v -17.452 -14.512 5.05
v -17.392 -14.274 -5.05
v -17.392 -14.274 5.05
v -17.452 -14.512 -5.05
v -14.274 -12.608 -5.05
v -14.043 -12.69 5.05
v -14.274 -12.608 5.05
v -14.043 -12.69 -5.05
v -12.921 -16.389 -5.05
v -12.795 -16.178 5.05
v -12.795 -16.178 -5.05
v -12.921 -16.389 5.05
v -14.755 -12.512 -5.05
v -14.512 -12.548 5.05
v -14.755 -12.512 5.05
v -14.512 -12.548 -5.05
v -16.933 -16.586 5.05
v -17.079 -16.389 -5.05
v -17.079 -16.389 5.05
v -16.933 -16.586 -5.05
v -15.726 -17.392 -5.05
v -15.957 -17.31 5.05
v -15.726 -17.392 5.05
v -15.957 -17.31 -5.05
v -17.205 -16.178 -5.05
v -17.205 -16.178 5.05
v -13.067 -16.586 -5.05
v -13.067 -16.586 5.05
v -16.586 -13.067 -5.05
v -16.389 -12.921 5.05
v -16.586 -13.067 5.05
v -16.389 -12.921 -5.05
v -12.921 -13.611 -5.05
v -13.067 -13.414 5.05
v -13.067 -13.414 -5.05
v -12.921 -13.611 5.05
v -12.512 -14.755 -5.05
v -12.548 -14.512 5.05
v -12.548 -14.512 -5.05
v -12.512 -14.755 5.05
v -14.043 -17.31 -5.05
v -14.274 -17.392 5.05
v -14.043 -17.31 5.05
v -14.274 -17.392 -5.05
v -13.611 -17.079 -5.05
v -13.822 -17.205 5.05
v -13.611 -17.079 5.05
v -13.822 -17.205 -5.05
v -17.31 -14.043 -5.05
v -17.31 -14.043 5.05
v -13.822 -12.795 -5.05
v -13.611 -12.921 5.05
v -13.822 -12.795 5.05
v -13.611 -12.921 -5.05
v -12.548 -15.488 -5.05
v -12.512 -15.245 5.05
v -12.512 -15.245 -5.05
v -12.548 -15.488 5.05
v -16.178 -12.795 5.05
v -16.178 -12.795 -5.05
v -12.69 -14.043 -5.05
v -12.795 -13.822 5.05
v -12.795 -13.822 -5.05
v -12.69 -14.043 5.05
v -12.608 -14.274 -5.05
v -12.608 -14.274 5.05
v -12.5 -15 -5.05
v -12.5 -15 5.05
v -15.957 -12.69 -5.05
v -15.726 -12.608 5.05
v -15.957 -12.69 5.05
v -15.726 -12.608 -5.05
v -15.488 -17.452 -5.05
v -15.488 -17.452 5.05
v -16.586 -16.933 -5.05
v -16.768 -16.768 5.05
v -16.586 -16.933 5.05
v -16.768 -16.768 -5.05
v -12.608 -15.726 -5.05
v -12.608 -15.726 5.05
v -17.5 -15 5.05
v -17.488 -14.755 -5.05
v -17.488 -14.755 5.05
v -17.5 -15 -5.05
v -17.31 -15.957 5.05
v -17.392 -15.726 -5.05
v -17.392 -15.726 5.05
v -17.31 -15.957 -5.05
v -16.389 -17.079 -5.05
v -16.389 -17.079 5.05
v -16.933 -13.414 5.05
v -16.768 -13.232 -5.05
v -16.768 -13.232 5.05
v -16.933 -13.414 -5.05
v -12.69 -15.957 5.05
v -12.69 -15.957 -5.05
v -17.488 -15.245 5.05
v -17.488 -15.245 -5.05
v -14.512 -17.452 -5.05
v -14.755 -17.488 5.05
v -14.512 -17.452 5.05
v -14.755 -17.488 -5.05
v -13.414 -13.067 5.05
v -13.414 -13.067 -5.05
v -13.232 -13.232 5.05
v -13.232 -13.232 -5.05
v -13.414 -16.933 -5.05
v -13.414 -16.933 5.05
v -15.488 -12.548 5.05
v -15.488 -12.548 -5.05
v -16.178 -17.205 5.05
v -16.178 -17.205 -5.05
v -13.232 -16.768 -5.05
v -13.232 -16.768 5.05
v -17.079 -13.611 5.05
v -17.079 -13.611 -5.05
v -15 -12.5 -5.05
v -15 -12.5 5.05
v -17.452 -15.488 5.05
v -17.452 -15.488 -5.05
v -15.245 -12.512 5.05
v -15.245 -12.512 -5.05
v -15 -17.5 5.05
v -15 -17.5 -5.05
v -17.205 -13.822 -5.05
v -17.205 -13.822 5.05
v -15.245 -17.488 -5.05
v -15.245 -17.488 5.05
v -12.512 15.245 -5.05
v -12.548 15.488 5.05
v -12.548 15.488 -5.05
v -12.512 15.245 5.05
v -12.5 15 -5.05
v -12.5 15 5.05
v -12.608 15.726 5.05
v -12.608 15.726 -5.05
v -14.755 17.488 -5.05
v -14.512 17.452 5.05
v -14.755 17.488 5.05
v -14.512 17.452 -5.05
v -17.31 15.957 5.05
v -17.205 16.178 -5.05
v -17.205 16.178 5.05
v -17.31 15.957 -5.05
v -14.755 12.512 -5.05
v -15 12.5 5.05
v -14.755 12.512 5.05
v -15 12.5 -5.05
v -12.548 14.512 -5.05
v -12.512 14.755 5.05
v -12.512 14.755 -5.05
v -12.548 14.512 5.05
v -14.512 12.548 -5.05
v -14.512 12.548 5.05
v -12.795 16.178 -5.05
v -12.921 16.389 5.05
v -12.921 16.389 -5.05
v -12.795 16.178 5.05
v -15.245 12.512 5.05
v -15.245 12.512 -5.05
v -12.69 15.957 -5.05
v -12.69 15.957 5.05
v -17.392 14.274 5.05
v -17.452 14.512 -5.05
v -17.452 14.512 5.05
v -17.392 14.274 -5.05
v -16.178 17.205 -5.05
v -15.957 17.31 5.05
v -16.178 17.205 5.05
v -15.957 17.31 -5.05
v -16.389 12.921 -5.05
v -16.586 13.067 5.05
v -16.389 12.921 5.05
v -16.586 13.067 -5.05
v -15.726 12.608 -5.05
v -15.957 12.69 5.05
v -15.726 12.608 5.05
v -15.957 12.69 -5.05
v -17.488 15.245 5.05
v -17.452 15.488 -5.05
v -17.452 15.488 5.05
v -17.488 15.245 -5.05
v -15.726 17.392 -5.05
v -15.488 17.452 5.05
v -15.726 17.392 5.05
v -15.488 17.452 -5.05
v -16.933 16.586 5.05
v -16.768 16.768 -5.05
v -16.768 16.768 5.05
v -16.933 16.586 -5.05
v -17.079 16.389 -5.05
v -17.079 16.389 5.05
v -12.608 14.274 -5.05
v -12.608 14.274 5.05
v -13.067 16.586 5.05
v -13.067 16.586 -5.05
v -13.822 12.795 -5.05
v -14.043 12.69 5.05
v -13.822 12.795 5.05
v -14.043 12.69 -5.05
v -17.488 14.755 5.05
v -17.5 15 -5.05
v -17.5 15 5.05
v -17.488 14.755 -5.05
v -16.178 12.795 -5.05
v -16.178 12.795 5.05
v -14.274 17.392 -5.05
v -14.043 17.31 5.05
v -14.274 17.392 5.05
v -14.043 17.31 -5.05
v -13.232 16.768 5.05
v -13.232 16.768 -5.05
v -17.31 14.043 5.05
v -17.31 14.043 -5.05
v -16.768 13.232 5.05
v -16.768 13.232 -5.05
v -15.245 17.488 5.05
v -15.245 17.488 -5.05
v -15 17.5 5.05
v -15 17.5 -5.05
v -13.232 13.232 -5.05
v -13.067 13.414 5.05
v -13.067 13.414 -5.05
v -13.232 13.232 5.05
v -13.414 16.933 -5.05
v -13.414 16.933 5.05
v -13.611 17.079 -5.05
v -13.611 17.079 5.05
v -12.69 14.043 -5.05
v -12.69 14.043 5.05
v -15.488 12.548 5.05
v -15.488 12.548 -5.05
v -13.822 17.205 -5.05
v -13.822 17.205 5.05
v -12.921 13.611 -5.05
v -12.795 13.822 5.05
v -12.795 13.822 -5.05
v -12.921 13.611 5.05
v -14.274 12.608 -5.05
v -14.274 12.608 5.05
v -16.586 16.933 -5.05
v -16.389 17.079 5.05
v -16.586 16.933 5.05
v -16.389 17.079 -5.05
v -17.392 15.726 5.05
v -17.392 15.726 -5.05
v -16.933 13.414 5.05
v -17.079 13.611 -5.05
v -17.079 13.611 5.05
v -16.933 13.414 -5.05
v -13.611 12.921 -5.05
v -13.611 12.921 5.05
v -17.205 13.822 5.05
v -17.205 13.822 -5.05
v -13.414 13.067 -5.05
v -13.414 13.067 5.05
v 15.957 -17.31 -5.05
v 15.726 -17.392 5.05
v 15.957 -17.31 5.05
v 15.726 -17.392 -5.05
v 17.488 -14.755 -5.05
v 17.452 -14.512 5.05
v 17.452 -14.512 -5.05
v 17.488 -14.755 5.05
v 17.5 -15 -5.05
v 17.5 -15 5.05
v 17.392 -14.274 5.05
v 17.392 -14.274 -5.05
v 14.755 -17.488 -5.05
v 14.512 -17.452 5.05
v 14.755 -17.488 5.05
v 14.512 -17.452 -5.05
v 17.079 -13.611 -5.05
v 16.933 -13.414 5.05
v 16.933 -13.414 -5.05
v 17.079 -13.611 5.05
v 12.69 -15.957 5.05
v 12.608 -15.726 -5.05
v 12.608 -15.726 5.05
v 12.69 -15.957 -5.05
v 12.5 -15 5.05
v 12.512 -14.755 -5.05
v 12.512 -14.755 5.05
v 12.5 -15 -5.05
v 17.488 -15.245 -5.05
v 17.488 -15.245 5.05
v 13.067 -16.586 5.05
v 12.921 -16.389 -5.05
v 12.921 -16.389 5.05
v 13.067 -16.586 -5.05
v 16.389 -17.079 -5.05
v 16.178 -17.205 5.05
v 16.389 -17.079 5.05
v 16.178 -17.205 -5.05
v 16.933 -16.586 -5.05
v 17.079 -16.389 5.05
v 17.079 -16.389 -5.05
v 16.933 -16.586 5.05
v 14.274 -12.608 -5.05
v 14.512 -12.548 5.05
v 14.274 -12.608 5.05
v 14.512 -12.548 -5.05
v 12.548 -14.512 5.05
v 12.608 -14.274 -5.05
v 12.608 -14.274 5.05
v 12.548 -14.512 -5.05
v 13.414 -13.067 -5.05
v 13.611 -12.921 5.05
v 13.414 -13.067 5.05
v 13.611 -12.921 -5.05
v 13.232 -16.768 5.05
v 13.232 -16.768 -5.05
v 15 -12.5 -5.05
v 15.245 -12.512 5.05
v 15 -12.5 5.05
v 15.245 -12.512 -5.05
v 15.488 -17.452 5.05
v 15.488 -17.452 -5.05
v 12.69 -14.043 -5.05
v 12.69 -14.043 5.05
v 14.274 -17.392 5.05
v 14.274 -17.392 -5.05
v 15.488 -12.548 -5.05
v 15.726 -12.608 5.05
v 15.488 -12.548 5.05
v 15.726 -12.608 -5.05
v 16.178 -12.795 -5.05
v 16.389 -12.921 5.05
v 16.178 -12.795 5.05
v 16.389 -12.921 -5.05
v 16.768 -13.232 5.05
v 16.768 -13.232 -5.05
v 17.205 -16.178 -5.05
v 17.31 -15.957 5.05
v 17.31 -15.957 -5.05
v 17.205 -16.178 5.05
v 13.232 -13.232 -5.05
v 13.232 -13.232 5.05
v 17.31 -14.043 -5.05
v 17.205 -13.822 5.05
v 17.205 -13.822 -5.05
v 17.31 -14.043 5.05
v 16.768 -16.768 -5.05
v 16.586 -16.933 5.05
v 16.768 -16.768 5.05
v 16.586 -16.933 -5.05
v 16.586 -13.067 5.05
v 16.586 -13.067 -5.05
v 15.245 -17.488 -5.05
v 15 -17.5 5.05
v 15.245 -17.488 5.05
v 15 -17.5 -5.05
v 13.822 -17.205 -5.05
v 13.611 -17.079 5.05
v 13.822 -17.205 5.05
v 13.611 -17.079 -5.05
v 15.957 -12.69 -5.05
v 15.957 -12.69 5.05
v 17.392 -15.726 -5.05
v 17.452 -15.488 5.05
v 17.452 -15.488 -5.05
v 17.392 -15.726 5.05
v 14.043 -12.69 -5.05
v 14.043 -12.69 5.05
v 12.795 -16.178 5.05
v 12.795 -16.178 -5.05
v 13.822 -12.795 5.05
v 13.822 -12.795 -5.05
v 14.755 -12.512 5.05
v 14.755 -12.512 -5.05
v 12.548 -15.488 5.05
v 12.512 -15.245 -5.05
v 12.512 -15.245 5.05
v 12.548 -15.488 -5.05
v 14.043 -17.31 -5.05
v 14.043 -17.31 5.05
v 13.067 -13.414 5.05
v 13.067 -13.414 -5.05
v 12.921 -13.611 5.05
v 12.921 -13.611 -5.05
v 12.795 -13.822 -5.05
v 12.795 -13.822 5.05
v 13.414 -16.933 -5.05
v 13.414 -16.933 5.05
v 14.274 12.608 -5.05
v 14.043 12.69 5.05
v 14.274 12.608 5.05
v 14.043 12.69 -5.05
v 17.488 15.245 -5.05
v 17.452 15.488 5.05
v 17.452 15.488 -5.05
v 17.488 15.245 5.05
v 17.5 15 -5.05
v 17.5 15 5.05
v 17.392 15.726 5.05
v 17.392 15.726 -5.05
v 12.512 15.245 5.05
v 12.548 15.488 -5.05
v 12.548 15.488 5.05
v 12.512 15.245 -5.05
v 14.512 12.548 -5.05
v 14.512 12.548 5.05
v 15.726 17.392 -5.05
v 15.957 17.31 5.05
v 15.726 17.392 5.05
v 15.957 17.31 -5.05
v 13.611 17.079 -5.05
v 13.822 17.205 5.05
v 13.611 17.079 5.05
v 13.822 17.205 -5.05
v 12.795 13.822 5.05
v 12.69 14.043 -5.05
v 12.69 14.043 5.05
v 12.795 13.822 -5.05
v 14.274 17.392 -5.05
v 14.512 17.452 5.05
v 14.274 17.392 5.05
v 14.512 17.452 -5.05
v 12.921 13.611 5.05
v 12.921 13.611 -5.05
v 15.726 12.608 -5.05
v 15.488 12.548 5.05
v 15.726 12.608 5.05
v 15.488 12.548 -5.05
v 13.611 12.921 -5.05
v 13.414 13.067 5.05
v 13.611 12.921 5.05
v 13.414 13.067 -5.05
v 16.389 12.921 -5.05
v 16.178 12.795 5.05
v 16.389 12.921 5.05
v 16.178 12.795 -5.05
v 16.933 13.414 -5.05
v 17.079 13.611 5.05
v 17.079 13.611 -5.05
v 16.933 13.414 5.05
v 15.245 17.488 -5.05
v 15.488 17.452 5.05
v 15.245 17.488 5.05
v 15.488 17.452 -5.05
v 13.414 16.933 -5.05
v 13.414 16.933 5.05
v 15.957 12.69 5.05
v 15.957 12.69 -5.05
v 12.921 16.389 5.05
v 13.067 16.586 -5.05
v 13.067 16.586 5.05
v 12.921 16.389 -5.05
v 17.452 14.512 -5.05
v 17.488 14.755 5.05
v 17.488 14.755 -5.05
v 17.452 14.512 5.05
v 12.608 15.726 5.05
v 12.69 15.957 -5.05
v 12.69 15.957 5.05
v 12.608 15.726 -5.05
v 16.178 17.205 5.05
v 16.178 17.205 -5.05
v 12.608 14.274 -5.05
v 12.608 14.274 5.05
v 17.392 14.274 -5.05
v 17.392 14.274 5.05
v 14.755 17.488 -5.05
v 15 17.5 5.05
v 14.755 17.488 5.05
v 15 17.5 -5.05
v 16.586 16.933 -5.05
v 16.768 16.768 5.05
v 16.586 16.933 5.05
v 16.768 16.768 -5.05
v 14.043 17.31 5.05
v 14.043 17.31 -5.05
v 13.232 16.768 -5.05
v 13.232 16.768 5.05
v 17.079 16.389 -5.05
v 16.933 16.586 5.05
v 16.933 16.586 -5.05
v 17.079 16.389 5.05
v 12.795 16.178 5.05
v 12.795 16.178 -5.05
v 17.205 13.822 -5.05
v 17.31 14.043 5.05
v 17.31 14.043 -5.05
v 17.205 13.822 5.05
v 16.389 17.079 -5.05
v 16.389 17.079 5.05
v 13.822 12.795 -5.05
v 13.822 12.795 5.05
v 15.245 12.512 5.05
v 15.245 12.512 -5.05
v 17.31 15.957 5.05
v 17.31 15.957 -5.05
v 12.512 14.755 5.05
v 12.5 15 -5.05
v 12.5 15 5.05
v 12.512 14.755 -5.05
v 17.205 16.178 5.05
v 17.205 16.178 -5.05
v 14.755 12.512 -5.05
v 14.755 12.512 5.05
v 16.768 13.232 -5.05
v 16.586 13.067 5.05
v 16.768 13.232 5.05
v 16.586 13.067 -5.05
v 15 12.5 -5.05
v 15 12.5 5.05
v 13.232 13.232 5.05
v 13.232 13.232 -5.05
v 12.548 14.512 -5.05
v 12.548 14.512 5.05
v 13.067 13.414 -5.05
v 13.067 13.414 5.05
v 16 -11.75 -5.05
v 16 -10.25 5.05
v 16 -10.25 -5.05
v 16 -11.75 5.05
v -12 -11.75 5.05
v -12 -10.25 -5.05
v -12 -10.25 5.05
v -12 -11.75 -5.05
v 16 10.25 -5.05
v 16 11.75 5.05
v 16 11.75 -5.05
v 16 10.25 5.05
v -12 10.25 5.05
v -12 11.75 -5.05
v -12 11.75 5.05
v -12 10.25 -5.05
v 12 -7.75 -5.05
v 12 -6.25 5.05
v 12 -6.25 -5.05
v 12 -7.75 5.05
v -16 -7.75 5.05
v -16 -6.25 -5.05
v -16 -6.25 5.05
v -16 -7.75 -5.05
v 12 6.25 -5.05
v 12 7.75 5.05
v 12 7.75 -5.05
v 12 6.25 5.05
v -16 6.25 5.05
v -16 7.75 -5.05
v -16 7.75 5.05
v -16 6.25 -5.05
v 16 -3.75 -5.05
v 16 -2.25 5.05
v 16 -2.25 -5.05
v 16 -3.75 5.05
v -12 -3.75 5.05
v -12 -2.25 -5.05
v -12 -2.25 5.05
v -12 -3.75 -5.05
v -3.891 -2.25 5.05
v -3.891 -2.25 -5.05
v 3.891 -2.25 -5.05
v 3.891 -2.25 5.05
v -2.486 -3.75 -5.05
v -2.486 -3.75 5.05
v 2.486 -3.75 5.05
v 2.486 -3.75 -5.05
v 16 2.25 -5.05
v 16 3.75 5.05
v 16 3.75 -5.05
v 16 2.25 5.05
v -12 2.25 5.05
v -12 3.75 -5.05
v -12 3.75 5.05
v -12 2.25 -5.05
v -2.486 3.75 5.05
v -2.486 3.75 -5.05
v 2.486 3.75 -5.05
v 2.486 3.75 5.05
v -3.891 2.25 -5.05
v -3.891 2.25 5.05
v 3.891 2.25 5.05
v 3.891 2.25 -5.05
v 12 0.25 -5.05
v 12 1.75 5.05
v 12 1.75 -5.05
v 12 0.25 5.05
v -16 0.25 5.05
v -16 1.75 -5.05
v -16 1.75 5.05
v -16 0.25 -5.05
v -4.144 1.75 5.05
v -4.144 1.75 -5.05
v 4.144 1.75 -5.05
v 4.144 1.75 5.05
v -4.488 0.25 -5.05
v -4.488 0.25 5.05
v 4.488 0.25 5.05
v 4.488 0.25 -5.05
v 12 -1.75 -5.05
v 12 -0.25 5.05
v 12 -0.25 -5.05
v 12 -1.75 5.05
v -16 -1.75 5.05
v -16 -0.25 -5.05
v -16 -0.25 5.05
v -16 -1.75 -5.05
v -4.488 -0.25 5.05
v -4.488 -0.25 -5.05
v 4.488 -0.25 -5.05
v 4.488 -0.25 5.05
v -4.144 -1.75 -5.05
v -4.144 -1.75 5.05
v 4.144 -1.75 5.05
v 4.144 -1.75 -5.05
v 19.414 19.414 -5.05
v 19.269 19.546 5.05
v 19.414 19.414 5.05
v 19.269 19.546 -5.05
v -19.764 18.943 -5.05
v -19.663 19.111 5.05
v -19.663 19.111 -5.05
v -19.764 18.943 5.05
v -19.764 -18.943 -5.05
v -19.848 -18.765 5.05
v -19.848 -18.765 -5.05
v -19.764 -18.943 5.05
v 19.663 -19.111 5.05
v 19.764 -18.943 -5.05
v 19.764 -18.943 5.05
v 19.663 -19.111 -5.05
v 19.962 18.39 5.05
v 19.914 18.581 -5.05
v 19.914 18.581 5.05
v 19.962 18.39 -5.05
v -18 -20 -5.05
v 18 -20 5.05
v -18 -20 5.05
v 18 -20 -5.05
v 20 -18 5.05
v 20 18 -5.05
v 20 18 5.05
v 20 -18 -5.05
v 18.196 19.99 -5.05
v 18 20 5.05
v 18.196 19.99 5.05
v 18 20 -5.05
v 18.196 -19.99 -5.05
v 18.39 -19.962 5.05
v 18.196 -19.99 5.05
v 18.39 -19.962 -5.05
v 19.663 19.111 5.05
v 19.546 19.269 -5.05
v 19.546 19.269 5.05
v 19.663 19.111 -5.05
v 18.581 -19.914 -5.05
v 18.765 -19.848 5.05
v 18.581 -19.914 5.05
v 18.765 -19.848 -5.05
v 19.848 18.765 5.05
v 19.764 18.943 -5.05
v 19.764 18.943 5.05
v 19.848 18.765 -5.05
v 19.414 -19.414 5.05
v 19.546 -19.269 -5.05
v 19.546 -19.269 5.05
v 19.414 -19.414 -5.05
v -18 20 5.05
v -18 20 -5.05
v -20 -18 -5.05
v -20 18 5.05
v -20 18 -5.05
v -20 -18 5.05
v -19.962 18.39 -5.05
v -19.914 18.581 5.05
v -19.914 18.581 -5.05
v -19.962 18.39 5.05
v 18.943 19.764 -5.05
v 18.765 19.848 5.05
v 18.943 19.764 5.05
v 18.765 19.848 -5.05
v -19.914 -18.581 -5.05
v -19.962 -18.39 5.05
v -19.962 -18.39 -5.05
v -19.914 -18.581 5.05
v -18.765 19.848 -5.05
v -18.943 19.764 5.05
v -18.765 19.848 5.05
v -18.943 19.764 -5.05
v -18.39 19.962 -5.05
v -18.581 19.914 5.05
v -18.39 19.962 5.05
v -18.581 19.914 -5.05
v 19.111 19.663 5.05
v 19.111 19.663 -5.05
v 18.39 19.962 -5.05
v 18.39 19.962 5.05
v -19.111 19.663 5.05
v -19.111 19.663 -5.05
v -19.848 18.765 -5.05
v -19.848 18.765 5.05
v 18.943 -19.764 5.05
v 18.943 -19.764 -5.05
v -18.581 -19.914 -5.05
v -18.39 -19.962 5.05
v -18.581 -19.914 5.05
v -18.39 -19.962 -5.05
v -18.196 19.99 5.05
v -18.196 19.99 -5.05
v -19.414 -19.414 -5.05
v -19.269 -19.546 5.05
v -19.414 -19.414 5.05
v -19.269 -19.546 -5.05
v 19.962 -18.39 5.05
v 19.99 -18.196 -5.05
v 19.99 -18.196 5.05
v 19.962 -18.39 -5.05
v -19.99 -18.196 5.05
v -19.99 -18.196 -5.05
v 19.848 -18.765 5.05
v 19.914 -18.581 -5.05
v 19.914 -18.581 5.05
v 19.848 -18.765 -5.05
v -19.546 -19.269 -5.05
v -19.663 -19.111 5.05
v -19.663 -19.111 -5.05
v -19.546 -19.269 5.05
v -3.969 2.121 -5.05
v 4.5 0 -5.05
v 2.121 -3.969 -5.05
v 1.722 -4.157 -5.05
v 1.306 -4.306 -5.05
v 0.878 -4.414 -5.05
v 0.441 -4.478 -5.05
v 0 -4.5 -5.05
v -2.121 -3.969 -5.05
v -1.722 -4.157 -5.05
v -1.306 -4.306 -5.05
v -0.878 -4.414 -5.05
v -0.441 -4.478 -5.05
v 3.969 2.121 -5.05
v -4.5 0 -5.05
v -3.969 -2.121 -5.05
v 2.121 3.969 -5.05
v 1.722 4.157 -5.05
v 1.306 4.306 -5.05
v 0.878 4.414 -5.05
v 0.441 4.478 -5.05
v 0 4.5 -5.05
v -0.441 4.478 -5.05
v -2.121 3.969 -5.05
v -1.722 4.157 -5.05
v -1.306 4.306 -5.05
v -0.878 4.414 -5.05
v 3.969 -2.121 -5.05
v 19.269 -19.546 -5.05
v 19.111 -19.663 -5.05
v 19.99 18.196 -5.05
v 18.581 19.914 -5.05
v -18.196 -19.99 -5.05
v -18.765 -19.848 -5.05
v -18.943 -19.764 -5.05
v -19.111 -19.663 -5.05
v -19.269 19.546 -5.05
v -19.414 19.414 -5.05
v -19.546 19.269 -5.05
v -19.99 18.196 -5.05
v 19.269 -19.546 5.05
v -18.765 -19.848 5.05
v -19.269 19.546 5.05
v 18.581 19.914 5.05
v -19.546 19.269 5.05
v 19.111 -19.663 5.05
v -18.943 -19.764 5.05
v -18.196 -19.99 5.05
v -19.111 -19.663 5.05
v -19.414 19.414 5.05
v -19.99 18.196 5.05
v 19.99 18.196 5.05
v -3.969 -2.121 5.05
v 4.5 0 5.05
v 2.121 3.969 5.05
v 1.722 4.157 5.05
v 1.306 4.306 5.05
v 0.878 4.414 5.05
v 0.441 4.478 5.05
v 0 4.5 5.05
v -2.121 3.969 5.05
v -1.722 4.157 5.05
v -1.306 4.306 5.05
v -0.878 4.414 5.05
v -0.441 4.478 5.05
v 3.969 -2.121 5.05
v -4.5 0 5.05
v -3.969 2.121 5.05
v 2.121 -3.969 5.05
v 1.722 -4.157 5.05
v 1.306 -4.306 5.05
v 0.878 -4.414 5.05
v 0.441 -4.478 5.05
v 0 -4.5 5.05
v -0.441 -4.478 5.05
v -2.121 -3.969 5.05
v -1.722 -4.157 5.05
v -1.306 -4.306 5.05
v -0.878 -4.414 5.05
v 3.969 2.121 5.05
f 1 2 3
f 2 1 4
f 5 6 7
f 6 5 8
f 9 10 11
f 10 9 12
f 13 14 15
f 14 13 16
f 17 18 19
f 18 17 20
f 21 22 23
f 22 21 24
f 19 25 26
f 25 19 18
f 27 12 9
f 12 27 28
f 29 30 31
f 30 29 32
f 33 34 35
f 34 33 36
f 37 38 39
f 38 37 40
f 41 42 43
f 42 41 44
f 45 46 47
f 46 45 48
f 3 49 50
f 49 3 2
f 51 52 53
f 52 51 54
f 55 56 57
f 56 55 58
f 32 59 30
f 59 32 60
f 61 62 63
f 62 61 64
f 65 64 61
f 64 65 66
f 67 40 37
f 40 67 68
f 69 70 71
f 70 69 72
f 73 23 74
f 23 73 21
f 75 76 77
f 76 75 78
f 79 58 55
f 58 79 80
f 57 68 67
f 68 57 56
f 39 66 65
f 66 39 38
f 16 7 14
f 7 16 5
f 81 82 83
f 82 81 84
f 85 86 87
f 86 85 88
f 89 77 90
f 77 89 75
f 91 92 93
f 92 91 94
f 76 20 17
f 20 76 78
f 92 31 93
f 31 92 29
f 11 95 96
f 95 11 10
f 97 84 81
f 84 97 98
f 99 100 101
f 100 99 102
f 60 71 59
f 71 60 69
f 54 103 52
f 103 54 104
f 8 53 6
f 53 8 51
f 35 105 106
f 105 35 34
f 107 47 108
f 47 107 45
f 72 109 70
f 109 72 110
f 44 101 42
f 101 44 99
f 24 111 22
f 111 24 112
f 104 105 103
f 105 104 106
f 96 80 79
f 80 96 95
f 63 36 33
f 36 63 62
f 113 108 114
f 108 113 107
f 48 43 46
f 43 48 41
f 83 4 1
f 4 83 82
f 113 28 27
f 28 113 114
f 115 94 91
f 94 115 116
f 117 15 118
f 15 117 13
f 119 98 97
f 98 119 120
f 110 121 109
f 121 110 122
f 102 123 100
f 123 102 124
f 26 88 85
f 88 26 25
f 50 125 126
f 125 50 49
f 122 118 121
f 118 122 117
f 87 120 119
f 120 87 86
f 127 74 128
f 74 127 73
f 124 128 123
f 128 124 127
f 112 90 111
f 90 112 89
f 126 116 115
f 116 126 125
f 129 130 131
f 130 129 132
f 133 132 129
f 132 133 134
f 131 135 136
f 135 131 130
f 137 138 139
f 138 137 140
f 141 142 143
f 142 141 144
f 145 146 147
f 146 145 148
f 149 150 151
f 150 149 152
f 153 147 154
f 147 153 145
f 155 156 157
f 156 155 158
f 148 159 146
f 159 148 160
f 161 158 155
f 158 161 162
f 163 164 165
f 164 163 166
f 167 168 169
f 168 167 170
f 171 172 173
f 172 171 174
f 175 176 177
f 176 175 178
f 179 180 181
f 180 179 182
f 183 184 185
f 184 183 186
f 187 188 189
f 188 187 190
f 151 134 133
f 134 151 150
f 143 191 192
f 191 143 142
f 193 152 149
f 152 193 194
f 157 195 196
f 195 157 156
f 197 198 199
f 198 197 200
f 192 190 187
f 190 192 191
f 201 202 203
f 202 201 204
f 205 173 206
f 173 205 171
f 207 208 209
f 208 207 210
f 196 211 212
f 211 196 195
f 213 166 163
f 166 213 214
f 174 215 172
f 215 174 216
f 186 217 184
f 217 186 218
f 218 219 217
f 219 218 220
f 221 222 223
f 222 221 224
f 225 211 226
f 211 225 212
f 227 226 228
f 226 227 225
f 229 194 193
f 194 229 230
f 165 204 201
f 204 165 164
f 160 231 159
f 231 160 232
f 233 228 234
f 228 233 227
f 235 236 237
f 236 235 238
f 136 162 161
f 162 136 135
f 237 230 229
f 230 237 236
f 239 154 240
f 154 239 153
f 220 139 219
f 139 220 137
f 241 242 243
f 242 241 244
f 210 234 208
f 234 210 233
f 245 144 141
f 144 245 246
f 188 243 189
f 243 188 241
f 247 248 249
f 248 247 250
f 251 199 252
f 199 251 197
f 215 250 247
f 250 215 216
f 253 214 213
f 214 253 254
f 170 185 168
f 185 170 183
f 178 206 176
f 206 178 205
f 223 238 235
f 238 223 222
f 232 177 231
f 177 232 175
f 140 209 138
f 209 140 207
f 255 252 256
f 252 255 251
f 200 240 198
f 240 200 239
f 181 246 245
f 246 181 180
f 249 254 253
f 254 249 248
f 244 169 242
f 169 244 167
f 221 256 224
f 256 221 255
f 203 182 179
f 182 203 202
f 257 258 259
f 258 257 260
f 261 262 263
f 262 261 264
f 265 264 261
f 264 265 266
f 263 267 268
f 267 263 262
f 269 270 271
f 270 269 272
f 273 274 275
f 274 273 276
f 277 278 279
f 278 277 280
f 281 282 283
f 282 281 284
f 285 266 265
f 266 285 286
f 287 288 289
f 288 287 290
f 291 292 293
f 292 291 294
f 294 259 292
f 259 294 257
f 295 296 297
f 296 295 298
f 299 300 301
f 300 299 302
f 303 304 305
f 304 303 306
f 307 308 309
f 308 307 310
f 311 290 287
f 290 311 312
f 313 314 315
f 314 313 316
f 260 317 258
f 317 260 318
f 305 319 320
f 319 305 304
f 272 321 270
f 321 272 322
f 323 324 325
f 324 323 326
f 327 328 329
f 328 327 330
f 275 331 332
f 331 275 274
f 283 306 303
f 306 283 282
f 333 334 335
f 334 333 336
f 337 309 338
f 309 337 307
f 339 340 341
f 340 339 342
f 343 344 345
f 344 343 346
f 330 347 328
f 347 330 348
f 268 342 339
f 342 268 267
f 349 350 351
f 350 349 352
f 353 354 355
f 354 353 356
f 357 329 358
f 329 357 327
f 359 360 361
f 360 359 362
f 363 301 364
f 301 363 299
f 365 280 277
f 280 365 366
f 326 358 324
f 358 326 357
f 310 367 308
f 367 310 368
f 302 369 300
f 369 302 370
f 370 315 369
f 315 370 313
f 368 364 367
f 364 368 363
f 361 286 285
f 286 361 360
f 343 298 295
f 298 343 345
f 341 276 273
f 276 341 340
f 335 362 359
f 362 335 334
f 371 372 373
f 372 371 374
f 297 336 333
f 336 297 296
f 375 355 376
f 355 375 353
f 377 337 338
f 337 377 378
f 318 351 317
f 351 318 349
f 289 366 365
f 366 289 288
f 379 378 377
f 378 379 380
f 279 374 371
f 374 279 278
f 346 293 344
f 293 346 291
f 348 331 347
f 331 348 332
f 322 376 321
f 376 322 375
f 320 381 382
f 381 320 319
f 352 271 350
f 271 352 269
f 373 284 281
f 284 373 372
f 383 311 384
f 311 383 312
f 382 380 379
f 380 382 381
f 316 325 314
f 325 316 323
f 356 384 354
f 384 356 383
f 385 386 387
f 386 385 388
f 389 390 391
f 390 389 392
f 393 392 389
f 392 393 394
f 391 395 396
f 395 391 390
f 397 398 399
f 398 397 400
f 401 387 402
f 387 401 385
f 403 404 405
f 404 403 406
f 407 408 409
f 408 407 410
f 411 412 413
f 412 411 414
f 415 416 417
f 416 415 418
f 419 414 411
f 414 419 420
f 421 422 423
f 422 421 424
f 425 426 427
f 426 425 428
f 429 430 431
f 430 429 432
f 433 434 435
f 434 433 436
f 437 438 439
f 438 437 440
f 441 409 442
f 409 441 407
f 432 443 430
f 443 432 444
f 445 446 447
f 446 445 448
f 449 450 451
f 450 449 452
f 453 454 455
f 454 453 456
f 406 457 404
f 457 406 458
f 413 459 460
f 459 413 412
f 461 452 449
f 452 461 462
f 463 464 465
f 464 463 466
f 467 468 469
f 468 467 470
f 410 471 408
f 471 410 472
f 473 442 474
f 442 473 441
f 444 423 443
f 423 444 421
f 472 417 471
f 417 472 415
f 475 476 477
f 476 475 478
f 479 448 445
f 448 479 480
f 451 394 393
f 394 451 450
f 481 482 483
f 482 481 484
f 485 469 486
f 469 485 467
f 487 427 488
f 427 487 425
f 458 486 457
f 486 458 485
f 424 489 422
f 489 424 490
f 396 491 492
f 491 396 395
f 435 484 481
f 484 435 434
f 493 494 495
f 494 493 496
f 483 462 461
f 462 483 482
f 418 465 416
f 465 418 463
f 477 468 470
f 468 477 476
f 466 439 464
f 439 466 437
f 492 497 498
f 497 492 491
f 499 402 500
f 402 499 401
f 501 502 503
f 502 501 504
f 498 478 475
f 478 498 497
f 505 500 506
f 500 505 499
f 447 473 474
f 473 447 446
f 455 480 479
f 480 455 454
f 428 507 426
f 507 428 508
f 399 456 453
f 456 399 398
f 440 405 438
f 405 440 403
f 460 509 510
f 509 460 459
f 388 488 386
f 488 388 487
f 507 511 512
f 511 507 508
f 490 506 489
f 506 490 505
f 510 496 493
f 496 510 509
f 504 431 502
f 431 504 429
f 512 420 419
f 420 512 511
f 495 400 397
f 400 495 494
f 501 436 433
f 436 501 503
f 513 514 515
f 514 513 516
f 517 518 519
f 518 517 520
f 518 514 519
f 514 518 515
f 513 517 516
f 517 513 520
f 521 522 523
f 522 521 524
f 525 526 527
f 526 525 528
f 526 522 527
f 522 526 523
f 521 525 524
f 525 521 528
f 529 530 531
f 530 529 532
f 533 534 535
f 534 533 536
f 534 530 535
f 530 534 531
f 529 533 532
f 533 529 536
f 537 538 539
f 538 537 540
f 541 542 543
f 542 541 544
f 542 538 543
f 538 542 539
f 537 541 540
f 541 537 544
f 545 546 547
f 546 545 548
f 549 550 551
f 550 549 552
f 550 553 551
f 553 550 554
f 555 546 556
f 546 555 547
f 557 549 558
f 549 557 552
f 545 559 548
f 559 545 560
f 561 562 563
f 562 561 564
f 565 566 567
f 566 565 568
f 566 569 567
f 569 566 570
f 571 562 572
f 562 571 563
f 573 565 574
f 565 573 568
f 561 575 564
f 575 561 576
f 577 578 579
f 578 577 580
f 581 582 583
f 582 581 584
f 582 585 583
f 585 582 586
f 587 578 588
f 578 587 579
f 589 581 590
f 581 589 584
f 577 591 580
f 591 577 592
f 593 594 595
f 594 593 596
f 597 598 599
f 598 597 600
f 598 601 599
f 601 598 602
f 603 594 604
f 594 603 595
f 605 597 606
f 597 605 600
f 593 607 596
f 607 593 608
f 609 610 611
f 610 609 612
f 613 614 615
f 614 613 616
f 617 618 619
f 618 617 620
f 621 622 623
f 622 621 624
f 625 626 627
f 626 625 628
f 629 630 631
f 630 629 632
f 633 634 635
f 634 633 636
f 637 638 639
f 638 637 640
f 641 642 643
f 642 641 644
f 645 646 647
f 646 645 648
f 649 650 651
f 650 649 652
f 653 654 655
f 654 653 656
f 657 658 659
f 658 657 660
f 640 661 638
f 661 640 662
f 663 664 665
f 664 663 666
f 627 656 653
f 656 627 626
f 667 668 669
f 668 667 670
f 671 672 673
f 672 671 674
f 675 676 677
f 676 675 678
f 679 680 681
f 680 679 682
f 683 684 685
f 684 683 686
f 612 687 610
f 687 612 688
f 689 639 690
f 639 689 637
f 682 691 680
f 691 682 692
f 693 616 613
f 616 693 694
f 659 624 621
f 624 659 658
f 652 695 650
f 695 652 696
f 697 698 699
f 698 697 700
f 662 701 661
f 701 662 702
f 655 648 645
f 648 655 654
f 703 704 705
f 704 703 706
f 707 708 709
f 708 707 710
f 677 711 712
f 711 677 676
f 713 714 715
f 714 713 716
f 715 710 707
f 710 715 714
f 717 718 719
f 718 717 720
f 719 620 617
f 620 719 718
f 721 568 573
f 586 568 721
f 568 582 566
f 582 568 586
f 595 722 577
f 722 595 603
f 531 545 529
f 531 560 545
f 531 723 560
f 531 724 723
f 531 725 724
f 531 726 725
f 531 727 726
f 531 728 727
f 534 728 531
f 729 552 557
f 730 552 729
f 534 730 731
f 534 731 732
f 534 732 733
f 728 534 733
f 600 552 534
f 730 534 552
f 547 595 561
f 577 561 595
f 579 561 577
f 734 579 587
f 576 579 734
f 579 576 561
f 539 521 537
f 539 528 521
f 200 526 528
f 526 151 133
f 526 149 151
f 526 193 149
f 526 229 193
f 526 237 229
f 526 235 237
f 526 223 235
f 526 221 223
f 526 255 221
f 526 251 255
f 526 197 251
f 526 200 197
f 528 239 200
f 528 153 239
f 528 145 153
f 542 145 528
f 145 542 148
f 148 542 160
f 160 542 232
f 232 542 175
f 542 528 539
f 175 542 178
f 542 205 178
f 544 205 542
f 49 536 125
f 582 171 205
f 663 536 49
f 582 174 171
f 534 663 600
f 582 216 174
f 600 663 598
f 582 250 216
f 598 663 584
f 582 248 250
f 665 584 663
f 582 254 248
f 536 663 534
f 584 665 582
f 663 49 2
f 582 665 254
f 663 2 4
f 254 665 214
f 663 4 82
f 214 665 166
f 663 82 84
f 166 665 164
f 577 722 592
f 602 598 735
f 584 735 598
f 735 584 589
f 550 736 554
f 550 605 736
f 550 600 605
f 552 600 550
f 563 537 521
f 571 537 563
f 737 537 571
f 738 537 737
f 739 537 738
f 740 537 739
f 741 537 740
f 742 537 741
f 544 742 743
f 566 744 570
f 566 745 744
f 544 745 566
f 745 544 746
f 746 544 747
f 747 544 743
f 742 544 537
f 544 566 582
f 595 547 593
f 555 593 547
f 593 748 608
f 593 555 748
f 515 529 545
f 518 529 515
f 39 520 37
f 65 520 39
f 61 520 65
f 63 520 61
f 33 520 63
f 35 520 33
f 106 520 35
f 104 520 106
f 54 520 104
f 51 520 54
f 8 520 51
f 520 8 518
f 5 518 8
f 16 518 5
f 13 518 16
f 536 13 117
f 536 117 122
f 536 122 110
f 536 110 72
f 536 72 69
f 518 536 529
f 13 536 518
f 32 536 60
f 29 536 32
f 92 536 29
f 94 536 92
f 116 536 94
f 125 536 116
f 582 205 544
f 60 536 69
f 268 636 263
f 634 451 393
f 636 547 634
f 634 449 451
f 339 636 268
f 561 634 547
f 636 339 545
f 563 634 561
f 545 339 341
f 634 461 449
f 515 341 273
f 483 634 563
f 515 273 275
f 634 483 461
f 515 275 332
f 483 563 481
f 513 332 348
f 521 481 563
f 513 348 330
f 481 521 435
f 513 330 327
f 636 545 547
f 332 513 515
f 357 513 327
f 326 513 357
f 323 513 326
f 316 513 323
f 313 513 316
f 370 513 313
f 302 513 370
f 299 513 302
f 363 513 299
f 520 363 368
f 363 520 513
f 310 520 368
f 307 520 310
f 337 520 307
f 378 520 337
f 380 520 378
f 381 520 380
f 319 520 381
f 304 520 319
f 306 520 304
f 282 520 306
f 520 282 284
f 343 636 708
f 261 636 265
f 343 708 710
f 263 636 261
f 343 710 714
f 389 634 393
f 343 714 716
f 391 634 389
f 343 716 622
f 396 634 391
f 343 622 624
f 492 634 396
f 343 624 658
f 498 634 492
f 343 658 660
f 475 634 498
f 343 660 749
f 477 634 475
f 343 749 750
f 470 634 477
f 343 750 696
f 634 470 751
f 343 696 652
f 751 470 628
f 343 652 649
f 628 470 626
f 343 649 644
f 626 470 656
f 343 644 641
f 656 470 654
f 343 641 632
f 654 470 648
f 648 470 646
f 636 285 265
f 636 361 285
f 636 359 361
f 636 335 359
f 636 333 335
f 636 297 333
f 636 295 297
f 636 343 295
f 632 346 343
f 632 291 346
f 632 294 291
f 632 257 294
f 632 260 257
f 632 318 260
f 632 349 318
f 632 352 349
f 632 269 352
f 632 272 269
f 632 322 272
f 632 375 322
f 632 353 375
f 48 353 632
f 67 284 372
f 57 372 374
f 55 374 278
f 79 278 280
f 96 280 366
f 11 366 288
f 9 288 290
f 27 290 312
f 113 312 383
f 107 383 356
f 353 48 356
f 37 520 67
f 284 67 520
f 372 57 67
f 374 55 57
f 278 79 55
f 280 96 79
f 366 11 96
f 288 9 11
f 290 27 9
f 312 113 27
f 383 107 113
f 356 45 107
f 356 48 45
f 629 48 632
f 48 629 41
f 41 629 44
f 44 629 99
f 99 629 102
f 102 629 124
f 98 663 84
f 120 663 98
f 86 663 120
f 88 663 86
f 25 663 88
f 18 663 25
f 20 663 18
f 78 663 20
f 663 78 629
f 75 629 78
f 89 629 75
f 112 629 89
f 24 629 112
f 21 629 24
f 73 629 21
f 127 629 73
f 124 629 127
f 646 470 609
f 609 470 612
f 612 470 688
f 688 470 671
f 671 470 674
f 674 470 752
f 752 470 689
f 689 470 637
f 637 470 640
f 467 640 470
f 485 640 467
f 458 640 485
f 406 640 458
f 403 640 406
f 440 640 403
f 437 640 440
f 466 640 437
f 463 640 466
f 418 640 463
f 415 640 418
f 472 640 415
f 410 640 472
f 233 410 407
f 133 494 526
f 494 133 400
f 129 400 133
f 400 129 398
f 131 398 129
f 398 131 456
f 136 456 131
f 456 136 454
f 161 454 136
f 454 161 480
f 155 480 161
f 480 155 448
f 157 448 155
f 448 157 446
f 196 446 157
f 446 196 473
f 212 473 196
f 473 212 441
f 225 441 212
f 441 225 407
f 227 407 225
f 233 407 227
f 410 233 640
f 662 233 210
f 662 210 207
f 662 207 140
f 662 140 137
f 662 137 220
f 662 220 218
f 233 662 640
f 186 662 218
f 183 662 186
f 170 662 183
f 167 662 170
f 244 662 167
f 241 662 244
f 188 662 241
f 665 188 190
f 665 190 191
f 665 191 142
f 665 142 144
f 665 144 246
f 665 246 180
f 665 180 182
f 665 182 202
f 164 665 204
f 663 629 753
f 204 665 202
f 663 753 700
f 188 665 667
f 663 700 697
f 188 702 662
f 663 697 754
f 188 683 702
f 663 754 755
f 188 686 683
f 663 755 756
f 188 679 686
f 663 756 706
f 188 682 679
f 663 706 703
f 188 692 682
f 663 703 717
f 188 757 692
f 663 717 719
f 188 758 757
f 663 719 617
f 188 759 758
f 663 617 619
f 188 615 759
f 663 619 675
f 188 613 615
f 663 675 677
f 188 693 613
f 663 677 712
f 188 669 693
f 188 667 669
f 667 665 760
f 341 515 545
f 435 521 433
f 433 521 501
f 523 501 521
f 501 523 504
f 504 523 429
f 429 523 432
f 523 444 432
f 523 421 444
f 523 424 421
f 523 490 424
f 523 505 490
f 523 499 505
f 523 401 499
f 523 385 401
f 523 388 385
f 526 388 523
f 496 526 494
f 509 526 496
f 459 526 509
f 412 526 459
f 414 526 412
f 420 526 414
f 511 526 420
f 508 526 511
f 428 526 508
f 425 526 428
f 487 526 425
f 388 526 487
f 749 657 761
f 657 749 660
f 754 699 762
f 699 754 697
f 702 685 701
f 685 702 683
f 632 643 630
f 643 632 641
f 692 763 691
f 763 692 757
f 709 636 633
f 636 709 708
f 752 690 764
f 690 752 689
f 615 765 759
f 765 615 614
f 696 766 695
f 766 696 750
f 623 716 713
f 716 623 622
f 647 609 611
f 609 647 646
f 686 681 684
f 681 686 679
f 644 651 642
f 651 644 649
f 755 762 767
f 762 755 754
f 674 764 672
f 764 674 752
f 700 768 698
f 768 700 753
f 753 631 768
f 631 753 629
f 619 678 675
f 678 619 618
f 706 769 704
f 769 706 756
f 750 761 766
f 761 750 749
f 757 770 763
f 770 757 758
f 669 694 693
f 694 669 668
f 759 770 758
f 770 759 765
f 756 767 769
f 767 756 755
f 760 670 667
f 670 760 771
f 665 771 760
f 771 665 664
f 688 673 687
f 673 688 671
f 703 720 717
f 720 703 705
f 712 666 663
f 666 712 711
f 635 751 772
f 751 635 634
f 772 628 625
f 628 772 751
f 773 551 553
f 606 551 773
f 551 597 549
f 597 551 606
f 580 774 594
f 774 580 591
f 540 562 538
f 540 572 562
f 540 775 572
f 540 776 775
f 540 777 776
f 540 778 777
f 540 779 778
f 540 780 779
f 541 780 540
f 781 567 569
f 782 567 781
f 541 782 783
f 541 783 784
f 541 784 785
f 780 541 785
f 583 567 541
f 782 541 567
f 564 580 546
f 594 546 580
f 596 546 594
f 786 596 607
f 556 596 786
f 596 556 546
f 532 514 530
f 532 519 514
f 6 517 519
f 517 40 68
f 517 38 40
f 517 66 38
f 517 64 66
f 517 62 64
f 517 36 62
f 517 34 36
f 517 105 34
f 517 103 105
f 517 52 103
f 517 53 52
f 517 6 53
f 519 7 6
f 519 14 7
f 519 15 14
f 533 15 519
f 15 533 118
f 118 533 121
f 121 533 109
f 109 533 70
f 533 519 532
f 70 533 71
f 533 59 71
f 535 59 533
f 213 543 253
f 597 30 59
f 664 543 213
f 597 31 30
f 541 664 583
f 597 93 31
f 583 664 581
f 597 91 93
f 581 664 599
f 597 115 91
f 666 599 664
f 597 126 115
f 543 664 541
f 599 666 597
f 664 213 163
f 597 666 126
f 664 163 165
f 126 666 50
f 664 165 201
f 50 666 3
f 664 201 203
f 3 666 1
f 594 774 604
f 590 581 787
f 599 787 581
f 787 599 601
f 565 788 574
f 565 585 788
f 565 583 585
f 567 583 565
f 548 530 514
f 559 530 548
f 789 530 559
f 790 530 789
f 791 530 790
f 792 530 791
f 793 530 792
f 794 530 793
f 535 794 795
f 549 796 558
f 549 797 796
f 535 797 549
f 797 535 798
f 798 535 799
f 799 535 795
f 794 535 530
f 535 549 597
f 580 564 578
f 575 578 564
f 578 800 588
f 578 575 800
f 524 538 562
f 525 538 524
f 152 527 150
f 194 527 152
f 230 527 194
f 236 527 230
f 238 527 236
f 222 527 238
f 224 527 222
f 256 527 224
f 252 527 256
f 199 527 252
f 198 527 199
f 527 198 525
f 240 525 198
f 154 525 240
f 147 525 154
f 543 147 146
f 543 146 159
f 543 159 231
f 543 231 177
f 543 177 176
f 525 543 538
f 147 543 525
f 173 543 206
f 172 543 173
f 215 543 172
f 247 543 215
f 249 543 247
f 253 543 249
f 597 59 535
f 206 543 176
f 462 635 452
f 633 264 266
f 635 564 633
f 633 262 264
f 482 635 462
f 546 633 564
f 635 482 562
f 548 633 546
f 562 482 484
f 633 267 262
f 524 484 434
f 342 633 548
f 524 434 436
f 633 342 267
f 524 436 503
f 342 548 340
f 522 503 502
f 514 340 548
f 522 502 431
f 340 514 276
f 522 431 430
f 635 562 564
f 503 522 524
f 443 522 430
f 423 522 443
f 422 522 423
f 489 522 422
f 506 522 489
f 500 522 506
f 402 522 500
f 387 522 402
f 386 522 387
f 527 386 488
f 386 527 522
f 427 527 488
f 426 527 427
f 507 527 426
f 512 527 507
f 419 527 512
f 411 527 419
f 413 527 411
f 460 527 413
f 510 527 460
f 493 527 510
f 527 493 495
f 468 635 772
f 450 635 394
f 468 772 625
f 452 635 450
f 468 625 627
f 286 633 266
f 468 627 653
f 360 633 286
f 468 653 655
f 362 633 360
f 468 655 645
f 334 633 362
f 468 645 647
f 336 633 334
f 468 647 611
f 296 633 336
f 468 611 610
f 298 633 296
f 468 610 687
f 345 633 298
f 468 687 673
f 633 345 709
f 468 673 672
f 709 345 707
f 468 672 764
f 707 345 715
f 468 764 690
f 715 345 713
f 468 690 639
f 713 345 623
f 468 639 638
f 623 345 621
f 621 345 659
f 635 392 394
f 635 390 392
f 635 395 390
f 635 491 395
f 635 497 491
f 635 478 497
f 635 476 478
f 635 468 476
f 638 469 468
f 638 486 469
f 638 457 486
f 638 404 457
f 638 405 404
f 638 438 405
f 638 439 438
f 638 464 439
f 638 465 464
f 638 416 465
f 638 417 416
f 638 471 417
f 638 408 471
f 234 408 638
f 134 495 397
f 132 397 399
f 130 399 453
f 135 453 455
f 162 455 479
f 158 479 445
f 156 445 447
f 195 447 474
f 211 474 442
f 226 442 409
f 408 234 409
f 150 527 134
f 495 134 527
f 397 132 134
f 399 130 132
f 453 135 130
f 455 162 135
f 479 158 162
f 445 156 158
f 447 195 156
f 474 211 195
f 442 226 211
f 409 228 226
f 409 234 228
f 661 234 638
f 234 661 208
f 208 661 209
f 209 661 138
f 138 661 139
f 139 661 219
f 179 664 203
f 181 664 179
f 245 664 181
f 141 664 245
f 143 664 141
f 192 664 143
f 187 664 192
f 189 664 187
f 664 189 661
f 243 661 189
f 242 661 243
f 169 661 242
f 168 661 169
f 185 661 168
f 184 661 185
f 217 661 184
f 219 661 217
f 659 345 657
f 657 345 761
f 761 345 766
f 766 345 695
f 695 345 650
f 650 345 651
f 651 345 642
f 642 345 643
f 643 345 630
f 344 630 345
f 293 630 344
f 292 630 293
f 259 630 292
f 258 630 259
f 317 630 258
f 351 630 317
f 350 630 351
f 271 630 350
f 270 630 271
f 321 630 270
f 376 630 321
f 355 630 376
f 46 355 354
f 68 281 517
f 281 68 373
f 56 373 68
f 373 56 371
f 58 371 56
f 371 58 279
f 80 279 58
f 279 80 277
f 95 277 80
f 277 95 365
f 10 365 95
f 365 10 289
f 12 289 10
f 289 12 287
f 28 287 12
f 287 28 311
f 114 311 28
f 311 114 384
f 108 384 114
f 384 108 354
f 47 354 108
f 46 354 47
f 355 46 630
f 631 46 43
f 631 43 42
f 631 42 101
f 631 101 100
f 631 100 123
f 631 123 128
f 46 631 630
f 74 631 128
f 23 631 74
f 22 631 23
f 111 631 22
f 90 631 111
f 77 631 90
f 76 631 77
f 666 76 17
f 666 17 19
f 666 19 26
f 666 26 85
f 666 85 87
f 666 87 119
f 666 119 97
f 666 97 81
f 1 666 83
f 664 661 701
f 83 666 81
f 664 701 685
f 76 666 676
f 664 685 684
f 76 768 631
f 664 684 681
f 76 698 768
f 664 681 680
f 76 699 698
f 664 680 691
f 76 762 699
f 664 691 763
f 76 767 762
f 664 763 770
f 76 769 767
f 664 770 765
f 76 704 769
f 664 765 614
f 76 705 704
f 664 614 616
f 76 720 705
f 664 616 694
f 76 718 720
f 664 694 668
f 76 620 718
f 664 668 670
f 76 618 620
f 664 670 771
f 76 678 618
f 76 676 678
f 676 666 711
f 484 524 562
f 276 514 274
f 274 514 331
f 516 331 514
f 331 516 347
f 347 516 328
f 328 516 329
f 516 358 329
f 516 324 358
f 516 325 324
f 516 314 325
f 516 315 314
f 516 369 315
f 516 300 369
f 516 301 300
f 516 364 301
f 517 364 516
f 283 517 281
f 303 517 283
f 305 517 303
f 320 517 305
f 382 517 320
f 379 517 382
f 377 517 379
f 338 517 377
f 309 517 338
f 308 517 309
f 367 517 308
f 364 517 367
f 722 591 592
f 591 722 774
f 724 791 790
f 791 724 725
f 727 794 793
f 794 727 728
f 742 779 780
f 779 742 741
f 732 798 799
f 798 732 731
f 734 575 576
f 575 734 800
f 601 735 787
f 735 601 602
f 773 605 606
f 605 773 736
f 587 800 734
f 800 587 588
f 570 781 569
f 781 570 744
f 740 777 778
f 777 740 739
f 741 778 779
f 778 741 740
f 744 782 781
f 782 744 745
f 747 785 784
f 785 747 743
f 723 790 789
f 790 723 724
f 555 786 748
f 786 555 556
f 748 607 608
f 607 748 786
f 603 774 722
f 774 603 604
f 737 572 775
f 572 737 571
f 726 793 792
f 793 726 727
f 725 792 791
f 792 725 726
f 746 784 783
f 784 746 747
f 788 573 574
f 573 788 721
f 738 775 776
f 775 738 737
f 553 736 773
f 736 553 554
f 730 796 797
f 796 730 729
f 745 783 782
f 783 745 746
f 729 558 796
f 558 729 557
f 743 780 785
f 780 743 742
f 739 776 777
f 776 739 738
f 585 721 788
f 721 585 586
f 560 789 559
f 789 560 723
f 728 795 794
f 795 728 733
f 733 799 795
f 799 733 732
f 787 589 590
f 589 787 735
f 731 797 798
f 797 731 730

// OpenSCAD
/*
 * REVOLUTIONARY TECHNOLOGY: HYDRO-GRADE TITANIUM FLEXURE MOUNT
 * Material: Solid Titanium Grade 5 (Ti-6Al-4V)
 * Function: Replaces rubber elastomer plugs in high-shear fluid environments.
 * Uses a monolithic wire-EDM serpentine cut to create a structural metal spring
 * that isolates acoustic vibration without tearing under water pressure.
 */

$fn = 64;

// Mount Dimensions
mount_length = 40;
mount_width = 40;
mount_thickness = 10;

// Flexure Cut Parameters
cut_width = 1.5; // Wire-EDM cut thickness
beam_thickness = 2.5; // Thickness of the resulting titanium spring beams
num_folds = 4;

module monolithic_titanium_flexure() {
    color("Silver") {
        difference() {
            // Main Solid Block
            minkowski() {
                cube([mount_length - 4, mount_width - 4, mount_thickness], center=true);
                cylinder(r=2, h=0.1, center=true);
            }
            
            // Central Mounting Hole (For the Turbine Bolt)
            cylinder(r=4.5, h=mount_thickness + 5, center=true);
            
            // Outer Mounting Holes (To bolt to the chassis)
            for (x = [-mount_length/2 + 5, mount_length/2 - 5]) {
                for (y = [-mount_width/2 + 5, mount_width/2 - 5]) {
                    translate([x, y, 0])
                        cylinder(r=2.5, h=mount_thickness + 5, center=true);
                }
            }
            
            // The Serpentine EDM Cuts (Creating the Flexure Spring)
            // These cuts sever the direct physical connection between the center 
            // and the outer edge, forcing vibrations to travel a long, bending path.
            for (i = [1 : num_folds]) {
                // Cut from the Left
                if (i % 2 != 0) {
                    translate([2, (i * (cut_width + beam_thickness)) - (mount_width/2) + 5, 0])
                        cube([mount_length - 12, cut_width, mount_thickness + 2], center=true);
                }
                // Cut from the Right
                else {
                    translate([-2, (i * (cut_width + beam_thickness)) - (mount_width/2) + 5, 0])
                        cube([mount_length - 12, cut_width, mount_thickness + 2], center=true);
                }
                
                // Mirror the cuts on the bottom half
                if (i % 2 != 0) {
                    translate([2, -((i * (cut_width + beam_thickness)) - (mount_width/2) + 5), 0])
                        cube([mount_length - 12, cut_width, mount_thickness + 2], center=true);
                }
                else {
                    translate([-2, -((i * (cut_width + beam_thickness)) - (mount_width/2) + 5), 0])
                        cube([mount_length - 12, cut_width, mount_thickness + 2], center=true);
                }
            }
        }
    }
}

// Render the Flexure
monolithic_titanium_flexure();
